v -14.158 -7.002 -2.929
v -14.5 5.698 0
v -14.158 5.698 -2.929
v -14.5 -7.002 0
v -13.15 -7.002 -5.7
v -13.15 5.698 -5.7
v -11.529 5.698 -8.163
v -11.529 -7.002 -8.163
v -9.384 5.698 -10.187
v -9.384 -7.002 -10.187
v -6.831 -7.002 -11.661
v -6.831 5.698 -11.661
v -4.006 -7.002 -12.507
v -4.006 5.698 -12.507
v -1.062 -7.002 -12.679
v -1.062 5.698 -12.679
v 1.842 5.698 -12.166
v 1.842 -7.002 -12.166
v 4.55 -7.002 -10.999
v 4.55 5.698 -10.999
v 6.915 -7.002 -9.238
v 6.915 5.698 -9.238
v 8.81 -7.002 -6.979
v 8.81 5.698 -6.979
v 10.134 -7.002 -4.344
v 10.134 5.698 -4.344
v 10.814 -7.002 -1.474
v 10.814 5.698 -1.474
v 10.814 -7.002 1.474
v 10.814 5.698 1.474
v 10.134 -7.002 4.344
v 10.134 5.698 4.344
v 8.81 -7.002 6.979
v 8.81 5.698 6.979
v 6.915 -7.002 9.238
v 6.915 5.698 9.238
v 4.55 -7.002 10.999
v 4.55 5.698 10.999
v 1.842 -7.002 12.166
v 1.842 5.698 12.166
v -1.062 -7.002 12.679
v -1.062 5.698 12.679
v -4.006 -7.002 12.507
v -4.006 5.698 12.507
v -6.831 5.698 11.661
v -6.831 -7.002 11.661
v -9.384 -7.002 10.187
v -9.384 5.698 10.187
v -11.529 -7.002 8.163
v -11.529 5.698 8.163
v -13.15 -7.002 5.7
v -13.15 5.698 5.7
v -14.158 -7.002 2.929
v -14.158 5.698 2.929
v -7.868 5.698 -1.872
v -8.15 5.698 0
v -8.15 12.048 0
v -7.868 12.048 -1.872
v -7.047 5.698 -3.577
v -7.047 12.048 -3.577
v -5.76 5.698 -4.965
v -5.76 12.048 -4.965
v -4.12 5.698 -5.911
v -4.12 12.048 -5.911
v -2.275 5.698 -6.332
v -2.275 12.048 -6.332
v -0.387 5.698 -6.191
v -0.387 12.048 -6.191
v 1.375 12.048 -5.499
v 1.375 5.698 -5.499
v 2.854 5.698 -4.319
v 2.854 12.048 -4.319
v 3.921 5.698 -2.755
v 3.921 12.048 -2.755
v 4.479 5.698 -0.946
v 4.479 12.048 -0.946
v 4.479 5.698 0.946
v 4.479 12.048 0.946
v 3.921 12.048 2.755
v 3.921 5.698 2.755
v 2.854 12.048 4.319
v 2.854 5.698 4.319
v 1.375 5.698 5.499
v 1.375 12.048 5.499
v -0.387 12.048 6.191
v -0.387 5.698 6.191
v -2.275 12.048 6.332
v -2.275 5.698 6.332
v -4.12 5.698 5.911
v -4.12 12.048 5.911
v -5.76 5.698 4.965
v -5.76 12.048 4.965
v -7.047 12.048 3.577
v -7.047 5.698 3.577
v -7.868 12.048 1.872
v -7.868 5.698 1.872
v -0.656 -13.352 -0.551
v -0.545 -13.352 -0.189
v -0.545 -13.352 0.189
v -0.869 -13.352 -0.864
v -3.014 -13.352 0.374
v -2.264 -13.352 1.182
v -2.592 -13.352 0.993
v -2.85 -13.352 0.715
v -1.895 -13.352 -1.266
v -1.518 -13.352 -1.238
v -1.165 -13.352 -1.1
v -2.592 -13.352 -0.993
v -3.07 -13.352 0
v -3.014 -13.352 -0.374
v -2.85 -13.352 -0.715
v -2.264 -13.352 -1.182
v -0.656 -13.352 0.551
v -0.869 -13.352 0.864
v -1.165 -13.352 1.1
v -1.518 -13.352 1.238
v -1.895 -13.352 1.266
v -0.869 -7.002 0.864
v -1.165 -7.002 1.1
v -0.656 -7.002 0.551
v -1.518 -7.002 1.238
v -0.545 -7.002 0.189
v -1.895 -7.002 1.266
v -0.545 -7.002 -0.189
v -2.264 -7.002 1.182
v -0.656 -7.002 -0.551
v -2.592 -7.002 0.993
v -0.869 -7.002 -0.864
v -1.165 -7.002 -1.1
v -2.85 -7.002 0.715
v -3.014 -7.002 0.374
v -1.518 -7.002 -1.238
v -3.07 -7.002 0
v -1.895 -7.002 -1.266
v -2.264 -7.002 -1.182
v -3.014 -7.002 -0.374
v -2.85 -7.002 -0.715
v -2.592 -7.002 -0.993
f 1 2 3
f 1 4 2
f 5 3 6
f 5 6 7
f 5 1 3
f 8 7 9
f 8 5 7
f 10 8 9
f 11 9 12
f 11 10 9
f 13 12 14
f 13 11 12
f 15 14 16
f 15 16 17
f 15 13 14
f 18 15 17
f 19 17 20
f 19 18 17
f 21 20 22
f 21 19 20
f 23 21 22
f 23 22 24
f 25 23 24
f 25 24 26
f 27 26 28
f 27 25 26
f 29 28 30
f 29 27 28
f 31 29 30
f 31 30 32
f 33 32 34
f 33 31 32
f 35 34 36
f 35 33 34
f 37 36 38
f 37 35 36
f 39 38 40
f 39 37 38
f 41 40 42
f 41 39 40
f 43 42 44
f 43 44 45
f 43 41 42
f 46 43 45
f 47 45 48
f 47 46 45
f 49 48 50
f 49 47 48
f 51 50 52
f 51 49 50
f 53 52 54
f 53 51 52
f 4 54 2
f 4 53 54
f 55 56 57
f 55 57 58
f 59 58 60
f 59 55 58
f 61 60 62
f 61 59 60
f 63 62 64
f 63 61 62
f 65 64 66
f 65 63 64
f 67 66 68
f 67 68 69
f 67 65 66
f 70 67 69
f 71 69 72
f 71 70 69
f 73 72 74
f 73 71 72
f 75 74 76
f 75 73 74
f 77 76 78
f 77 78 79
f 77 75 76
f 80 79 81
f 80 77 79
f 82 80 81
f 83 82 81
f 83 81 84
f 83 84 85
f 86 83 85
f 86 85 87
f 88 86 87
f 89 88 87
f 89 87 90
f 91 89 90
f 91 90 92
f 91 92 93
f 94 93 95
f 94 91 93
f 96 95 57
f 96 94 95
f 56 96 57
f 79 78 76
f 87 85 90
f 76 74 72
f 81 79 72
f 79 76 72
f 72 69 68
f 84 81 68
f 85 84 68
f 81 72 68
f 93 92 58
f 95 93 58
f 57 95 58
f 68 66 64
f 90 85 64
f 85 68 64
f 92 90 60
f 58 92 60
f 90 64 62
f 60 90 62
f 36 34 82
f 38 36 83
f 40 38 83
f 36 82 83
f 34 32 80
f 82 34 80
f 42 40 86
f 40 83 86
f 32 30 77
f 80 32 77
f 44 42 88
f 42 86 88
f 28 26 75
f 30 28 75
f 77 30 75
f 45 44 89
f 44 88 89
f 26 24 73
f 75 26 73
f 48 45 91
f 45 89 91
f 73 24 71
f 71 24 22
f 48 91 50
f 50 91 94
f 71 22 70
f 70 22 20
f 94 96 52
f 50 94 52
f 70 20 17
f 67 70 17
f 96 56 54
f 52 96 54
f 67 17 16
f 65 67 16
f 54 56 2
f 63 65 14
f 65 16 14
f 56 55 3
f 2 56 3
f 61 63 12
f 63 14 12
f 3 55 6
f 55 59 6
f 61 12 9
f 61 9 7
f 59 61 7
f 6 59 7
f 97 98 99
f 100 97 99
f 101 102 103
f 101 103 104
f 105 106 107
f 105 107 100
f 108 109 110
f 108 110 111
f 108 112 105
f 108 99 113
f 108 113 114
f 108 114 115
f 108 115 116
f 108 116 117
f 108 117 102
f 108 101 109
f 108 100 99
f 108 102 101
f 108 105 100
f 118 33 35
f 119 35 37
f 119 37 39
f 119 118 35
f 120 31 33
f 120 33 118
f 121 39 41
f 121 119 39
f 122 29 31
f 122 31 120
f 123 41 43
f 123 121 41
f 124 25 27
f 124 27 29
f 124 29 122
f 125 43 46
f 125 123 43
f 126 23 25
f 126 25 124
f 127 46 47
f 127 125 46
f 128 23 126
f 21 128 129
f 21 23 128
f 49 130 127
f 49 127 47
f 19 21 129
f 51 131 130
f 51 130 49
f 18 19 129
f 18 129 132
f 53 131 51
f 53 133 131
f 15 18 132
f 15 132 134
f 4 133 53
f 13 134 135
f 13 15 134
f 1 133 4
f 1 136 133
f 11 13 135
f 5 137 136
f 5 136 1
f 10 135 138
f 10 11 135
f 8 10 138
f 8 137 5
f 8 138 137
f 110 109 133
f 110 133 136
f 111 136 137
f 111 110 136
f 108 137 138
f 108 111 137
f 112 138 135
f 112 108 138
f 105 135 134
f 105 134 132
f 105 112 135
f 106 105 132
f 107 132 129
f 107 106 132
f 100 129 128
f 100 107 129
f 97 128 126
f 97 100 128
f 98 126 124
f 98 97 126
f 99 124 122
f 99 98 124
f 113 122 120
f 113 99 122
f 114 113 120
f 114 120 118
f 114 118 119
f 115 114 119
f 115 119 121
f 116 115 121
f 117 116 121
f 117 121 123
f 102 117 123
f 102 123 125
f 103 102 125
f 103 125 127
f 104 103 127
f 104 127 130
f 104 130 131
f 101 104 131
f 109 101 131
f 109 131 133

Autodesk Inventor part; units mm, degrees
ref_plane "YZ Plane" through (0, 0, 0) normal (1, 0, 0) x (0, 1, 0)
ref_plane "XZ Plane" through (0, 0, 0) normal (0, 1, 0) x (-1, 0, 0)
ref_plane "XY Plane" through (0, 0, 0) normal (0, 0, 1) x (1, 0, 0)
sketch "Sketch1" plane through (0, 0, 0) normal (0, 0, 1) x (1, 0, 0)
  line L0 (-8.1504, 12.0476) -> (-8.1504, 5.6976)
  line L1 (-8.1504, 5.6976) -> (-14.5004, 5.6976)
  line L2 (-14.5004, 5.6976) -> (-14.5004, -7.0024)
  line L3 (-14.5004, -7.0024) -> (-3.0704, -7.0024)
  line L4 (-3.0704, -7.0024) -> (-3.0704, -13.3524)
  line L5 (-3.0704, -13.3524) -> (-1.8004, -13.3524)
  line L6 (-1.8004, 12.0476) -> (-8.1504, 12.0476)
  line L7 (-1.8004, 12.0476) -> (-1.8004, -13.3524)
  dimension "d0" = 12.7
  dimension "d1" = 6.35
  dimension "d3" = 1.27
  dimension "d8" = 12.7
  dimension "d9" = 6.35
revolve "Revolution1" add sketch "Sketch1" angle 360 about axis through (-1.8004, 12.0476, 0) along (0, -1, 0)
properties part number "roll2"
